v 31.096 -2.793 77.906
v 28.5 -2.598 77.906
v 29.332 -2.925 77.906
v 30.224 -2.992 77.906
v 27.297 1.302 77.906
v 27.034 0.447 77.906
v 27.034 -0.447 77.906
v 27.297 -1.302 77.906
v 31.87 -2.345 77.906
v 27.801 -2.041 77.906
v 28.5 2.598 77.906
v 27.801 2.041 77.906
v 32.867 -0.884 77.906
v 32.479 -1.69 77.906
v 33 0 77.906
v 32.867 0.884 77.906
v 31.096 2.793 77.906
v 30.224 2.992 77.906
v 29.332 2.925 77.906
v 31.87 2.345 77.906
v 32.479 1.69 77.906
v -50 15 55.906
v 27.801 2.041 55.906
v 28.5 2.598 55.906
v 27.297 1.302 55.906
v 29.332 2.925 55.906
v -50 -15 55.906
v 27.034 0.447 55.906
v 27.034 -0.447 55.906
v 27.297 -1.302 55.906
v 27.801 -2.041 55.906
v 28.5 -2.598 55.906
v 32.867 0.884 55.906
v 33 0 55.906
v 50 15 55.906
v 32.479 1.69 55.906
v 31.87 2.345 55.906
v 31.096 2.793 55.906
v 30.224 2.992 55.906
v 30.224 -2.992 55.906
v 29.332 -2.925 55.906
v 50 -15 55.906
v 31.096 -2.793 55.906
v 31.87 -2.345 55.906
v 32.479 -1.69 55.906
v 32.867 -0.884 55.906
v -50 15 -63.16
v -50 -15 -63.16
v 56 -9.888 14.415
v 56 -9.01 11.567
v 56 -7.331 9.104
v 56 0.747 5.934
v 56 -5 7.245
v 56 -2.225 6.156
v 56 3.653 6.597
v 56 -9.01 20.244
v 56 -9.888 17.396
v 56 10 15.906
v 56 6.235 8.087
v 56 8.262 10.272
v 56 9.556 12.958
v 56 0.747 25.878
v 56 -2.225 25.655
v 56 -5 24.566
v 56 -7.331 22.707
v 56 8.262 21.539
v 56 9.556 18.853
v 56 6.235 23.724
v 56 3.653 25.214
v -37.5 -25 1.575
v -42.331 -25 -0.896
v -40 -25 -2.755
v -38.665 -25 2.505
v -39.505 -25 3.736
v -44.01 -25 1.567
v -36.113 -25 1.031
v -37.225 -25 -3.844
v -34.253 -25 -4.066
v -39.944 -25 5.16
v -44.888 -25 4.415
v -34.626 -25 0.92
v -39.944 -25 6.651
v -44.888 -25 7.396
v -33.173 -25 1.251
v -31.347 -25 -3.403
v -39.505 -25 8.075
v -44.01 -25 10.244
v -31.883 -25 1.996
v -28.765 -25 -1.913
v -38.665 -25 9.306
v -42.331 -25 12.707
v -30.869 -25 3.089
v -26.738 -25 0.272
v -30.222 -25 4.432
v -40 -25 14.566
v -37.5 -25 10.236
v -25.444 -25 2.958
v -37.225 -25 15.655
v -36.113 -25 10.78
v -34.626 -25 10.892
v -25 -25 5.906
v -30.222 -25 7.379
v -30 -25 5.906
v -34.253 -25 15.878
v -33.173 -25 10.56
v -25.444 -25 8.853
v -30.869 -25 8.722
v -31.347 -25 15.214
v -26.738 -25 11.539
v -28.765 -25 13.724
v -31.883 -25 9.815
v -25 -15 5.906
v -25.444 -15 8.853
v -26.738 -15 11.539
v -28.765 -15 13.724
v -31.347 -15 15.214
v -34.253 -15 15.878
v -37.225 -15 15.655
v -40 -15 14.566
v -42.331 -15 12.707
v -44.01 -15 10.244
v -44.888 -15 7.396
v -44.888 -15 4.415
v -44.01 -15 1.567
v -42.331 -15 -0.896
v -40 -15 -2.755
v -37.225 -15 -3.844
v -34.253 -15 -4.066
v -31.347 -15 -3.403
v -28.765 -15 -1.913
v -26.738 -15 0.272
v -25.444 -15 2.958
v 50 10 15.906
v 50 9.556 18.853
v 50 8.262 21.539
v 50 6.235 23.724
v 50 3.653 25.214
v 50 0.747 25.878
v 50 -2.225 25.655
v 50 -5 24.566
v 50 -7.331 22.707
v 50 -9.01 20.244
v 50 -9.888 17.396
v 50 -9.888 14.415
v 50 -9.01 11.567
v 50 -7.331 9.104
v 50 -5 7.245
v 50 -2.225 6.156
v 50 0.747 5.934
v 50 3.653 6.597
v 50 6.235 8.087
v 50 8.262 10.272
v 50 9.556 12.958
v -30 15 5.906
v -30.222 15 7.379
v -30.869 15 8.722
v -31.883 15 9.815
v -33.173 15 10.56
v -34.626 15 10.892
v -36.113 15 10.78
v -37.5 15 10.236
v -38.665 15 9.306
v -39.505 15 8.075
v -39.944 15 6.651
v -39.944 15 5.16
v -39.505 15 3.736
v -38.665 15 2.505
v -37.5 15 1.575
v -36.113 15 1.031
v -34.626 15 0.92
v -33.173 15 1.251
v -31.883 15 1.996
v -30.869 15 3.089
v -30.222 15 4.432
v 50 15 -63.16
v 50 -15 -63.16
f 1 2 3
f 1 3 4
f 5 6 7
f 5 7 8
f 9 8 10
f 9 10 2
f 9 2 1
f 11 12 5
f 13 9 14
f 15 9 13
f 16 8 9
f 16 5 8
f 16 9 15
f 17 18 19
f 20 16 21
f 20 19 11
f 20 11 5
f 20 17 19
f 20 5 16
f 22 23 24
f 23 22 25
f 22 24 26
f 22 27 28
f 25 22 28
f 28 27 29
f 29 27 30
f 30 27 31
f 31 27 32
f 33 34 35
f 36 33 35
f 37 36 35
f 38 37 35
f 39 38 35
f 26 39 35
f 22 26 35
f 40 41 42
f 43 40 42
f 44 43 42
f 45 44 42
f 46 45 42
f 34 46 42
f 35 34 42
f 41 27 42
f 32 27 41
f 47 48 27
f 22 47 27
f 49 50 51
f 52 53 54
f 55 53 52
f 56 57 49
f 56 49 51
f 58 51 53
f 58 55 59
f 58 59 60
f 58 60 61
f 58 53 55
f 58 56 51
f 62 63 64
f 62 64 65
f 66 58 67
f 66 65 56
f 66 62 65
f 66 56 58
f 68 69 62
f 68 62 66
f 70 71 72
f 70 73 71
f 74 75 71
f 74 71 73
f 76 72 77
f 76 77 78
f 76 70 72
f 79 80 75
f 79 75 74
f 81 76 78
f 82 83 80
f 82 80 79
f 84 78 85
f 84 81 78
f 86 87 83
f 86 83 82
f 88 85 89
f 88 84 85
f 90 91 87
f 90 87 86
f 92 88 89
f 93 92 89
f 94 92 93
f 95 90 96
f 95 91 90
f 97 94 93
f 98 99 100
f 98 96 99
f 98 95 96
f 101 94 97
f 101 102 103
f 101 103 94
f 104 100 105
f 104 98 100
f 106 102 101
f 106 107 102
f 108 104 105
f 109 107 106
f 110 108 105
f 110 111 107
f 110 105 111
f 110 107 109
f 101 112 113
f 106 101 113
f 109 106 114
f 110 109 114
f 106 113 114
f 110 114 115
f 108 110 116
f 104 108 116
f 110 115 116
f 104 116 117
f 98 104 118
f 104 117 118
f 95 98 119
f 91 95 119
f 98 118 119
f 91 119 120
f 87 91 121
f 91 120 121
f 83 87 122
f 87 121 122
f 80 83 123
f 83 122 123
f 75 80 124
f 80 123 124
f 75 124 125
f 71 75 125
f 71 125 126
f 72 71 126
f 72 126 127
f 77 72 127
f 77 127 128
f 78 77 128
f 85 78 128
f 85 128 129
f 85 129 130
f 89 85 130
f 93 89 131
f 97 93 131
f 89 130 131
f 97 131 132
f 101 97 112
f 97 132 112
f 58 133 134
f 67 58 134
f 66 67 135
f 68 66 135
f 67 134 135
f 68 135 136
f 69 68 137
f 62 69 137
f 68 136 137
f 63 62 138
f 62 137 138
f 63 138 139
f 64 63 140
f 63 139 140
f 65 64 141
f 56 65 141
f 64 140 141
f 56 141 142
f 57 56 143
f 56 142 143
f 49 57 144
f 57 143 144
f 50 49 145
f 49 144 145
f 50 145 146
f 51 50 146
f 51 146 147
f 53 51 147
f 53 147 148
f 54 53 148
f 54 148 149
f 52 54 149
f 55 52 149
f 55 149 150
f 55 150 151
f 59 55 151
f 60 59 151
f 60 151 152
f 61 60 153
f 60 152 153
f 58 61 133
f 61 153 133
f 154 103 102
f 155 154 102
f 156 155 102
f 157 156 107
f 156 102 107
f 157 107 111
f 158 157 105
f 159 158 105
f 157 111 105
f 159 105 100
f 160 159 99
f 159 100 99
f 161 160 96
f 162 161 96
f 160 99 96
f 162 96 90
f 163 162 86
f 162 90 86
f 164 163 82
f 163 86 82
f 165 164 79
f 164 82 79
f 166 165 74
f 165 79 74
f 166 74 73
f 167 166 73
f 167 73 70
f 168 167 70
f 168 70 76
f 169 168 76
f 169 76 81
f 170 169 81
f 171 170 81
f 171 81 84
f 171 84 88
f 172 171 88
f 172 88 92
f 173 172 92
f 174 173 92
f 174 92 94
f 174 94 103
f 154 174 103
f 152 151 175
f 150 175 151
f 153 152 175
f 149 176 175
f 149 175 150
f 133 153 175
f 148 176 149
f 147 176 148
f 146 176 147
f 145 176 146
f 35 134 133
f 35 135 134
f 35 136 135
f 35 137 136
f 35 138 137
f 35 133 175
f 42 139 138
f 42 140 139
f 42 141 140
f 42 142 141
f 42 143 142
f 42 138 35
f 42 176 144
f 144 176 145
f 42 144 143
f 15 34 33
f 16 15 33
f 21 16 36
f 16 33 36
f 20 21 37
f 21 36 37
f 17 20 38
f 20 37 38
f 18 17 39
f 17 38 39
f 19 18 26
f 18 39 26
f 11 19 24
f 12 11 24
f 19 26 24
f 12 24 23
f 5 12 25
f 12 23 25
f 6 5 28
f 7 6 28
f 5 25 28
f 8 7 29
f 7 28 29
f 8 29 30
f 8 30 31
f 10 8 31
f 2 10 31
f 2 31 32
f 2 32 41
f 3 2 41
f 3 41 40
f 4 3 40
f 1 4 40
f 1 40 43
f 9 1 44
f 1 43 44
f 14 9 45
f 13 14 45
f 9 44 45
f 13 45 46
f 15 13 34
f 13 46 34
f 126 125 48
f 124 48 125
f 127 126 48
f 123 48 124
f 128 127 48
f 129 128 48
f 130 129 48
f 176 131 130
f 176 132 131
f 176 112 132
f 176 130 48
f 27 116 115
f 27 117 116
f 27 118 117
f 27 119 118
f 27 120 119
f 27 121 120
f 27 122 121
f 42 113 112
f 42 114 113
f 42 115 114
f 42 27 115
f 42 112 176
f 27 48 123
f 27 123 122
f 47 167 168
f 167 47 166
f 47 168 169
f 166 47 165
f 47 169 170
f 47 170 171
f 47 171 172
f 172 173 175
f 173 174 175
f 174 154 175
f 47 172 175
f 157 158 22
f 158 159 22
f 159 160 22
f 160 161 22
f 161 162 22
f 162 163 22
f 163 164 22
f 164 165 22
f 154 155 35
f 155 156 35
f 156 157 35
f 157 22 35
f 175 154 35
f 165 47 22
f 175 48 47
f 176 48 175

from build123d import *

# Parameters (mm, degrees)
F0_W     = 100
F0_H     = 119.065711
F1_DEPTH = 15
F2_R     = 10
F3_DEPTH = 10
F4_R     = 10
F5_DEPTH = 6
F6_R     = 3
F7_DEPTH = 22
F8_R     = 5
F9_DEPTH = 40.001


with BuildPart() as f1:
    # F0 (on Front) → F1 (new body, symmetric)
    with BuildSketch(Plane.XZ):
        with Locations((0, -3.62726)):
            Rectangle(F0_W, F0_H)
    extrude(amount=F1_DEPTH, both=True)

    # F2 (on face) → F3 (join)
    with BuildSketch(Plane.XZ.offset(15)):
        with Locations((-35, 5.905595)):
            Circle(F2_R)
    extrude(amount=F3_DEPTH)

    # F4 (on face) → F5 (join)
    with BuildSketch(Plane.YZ.offset(50)):
        with Locations((0, 15.905595)):
            Circle(F4_R)
    extrude(amount=F5_DEPTH)

    # F6 (on face) → F7 (join)
    with BuildSketch(Plane.XY.offset(55.905595)):
        with Locations((30, 0)):
            Circle(F6_R)
    extrude(amount=F7_DEPTH)

    # F8 (on face) → F9 (cut, through all)
    with BuildSketch(Plane.XZ.offset(25)):
        with Locations((-35, 5.905595)):
            Circle(F8_R)
    extrude(amount=-F9_DEPTH, mode=Mode.SUBTRACT)


solid = f1.part
